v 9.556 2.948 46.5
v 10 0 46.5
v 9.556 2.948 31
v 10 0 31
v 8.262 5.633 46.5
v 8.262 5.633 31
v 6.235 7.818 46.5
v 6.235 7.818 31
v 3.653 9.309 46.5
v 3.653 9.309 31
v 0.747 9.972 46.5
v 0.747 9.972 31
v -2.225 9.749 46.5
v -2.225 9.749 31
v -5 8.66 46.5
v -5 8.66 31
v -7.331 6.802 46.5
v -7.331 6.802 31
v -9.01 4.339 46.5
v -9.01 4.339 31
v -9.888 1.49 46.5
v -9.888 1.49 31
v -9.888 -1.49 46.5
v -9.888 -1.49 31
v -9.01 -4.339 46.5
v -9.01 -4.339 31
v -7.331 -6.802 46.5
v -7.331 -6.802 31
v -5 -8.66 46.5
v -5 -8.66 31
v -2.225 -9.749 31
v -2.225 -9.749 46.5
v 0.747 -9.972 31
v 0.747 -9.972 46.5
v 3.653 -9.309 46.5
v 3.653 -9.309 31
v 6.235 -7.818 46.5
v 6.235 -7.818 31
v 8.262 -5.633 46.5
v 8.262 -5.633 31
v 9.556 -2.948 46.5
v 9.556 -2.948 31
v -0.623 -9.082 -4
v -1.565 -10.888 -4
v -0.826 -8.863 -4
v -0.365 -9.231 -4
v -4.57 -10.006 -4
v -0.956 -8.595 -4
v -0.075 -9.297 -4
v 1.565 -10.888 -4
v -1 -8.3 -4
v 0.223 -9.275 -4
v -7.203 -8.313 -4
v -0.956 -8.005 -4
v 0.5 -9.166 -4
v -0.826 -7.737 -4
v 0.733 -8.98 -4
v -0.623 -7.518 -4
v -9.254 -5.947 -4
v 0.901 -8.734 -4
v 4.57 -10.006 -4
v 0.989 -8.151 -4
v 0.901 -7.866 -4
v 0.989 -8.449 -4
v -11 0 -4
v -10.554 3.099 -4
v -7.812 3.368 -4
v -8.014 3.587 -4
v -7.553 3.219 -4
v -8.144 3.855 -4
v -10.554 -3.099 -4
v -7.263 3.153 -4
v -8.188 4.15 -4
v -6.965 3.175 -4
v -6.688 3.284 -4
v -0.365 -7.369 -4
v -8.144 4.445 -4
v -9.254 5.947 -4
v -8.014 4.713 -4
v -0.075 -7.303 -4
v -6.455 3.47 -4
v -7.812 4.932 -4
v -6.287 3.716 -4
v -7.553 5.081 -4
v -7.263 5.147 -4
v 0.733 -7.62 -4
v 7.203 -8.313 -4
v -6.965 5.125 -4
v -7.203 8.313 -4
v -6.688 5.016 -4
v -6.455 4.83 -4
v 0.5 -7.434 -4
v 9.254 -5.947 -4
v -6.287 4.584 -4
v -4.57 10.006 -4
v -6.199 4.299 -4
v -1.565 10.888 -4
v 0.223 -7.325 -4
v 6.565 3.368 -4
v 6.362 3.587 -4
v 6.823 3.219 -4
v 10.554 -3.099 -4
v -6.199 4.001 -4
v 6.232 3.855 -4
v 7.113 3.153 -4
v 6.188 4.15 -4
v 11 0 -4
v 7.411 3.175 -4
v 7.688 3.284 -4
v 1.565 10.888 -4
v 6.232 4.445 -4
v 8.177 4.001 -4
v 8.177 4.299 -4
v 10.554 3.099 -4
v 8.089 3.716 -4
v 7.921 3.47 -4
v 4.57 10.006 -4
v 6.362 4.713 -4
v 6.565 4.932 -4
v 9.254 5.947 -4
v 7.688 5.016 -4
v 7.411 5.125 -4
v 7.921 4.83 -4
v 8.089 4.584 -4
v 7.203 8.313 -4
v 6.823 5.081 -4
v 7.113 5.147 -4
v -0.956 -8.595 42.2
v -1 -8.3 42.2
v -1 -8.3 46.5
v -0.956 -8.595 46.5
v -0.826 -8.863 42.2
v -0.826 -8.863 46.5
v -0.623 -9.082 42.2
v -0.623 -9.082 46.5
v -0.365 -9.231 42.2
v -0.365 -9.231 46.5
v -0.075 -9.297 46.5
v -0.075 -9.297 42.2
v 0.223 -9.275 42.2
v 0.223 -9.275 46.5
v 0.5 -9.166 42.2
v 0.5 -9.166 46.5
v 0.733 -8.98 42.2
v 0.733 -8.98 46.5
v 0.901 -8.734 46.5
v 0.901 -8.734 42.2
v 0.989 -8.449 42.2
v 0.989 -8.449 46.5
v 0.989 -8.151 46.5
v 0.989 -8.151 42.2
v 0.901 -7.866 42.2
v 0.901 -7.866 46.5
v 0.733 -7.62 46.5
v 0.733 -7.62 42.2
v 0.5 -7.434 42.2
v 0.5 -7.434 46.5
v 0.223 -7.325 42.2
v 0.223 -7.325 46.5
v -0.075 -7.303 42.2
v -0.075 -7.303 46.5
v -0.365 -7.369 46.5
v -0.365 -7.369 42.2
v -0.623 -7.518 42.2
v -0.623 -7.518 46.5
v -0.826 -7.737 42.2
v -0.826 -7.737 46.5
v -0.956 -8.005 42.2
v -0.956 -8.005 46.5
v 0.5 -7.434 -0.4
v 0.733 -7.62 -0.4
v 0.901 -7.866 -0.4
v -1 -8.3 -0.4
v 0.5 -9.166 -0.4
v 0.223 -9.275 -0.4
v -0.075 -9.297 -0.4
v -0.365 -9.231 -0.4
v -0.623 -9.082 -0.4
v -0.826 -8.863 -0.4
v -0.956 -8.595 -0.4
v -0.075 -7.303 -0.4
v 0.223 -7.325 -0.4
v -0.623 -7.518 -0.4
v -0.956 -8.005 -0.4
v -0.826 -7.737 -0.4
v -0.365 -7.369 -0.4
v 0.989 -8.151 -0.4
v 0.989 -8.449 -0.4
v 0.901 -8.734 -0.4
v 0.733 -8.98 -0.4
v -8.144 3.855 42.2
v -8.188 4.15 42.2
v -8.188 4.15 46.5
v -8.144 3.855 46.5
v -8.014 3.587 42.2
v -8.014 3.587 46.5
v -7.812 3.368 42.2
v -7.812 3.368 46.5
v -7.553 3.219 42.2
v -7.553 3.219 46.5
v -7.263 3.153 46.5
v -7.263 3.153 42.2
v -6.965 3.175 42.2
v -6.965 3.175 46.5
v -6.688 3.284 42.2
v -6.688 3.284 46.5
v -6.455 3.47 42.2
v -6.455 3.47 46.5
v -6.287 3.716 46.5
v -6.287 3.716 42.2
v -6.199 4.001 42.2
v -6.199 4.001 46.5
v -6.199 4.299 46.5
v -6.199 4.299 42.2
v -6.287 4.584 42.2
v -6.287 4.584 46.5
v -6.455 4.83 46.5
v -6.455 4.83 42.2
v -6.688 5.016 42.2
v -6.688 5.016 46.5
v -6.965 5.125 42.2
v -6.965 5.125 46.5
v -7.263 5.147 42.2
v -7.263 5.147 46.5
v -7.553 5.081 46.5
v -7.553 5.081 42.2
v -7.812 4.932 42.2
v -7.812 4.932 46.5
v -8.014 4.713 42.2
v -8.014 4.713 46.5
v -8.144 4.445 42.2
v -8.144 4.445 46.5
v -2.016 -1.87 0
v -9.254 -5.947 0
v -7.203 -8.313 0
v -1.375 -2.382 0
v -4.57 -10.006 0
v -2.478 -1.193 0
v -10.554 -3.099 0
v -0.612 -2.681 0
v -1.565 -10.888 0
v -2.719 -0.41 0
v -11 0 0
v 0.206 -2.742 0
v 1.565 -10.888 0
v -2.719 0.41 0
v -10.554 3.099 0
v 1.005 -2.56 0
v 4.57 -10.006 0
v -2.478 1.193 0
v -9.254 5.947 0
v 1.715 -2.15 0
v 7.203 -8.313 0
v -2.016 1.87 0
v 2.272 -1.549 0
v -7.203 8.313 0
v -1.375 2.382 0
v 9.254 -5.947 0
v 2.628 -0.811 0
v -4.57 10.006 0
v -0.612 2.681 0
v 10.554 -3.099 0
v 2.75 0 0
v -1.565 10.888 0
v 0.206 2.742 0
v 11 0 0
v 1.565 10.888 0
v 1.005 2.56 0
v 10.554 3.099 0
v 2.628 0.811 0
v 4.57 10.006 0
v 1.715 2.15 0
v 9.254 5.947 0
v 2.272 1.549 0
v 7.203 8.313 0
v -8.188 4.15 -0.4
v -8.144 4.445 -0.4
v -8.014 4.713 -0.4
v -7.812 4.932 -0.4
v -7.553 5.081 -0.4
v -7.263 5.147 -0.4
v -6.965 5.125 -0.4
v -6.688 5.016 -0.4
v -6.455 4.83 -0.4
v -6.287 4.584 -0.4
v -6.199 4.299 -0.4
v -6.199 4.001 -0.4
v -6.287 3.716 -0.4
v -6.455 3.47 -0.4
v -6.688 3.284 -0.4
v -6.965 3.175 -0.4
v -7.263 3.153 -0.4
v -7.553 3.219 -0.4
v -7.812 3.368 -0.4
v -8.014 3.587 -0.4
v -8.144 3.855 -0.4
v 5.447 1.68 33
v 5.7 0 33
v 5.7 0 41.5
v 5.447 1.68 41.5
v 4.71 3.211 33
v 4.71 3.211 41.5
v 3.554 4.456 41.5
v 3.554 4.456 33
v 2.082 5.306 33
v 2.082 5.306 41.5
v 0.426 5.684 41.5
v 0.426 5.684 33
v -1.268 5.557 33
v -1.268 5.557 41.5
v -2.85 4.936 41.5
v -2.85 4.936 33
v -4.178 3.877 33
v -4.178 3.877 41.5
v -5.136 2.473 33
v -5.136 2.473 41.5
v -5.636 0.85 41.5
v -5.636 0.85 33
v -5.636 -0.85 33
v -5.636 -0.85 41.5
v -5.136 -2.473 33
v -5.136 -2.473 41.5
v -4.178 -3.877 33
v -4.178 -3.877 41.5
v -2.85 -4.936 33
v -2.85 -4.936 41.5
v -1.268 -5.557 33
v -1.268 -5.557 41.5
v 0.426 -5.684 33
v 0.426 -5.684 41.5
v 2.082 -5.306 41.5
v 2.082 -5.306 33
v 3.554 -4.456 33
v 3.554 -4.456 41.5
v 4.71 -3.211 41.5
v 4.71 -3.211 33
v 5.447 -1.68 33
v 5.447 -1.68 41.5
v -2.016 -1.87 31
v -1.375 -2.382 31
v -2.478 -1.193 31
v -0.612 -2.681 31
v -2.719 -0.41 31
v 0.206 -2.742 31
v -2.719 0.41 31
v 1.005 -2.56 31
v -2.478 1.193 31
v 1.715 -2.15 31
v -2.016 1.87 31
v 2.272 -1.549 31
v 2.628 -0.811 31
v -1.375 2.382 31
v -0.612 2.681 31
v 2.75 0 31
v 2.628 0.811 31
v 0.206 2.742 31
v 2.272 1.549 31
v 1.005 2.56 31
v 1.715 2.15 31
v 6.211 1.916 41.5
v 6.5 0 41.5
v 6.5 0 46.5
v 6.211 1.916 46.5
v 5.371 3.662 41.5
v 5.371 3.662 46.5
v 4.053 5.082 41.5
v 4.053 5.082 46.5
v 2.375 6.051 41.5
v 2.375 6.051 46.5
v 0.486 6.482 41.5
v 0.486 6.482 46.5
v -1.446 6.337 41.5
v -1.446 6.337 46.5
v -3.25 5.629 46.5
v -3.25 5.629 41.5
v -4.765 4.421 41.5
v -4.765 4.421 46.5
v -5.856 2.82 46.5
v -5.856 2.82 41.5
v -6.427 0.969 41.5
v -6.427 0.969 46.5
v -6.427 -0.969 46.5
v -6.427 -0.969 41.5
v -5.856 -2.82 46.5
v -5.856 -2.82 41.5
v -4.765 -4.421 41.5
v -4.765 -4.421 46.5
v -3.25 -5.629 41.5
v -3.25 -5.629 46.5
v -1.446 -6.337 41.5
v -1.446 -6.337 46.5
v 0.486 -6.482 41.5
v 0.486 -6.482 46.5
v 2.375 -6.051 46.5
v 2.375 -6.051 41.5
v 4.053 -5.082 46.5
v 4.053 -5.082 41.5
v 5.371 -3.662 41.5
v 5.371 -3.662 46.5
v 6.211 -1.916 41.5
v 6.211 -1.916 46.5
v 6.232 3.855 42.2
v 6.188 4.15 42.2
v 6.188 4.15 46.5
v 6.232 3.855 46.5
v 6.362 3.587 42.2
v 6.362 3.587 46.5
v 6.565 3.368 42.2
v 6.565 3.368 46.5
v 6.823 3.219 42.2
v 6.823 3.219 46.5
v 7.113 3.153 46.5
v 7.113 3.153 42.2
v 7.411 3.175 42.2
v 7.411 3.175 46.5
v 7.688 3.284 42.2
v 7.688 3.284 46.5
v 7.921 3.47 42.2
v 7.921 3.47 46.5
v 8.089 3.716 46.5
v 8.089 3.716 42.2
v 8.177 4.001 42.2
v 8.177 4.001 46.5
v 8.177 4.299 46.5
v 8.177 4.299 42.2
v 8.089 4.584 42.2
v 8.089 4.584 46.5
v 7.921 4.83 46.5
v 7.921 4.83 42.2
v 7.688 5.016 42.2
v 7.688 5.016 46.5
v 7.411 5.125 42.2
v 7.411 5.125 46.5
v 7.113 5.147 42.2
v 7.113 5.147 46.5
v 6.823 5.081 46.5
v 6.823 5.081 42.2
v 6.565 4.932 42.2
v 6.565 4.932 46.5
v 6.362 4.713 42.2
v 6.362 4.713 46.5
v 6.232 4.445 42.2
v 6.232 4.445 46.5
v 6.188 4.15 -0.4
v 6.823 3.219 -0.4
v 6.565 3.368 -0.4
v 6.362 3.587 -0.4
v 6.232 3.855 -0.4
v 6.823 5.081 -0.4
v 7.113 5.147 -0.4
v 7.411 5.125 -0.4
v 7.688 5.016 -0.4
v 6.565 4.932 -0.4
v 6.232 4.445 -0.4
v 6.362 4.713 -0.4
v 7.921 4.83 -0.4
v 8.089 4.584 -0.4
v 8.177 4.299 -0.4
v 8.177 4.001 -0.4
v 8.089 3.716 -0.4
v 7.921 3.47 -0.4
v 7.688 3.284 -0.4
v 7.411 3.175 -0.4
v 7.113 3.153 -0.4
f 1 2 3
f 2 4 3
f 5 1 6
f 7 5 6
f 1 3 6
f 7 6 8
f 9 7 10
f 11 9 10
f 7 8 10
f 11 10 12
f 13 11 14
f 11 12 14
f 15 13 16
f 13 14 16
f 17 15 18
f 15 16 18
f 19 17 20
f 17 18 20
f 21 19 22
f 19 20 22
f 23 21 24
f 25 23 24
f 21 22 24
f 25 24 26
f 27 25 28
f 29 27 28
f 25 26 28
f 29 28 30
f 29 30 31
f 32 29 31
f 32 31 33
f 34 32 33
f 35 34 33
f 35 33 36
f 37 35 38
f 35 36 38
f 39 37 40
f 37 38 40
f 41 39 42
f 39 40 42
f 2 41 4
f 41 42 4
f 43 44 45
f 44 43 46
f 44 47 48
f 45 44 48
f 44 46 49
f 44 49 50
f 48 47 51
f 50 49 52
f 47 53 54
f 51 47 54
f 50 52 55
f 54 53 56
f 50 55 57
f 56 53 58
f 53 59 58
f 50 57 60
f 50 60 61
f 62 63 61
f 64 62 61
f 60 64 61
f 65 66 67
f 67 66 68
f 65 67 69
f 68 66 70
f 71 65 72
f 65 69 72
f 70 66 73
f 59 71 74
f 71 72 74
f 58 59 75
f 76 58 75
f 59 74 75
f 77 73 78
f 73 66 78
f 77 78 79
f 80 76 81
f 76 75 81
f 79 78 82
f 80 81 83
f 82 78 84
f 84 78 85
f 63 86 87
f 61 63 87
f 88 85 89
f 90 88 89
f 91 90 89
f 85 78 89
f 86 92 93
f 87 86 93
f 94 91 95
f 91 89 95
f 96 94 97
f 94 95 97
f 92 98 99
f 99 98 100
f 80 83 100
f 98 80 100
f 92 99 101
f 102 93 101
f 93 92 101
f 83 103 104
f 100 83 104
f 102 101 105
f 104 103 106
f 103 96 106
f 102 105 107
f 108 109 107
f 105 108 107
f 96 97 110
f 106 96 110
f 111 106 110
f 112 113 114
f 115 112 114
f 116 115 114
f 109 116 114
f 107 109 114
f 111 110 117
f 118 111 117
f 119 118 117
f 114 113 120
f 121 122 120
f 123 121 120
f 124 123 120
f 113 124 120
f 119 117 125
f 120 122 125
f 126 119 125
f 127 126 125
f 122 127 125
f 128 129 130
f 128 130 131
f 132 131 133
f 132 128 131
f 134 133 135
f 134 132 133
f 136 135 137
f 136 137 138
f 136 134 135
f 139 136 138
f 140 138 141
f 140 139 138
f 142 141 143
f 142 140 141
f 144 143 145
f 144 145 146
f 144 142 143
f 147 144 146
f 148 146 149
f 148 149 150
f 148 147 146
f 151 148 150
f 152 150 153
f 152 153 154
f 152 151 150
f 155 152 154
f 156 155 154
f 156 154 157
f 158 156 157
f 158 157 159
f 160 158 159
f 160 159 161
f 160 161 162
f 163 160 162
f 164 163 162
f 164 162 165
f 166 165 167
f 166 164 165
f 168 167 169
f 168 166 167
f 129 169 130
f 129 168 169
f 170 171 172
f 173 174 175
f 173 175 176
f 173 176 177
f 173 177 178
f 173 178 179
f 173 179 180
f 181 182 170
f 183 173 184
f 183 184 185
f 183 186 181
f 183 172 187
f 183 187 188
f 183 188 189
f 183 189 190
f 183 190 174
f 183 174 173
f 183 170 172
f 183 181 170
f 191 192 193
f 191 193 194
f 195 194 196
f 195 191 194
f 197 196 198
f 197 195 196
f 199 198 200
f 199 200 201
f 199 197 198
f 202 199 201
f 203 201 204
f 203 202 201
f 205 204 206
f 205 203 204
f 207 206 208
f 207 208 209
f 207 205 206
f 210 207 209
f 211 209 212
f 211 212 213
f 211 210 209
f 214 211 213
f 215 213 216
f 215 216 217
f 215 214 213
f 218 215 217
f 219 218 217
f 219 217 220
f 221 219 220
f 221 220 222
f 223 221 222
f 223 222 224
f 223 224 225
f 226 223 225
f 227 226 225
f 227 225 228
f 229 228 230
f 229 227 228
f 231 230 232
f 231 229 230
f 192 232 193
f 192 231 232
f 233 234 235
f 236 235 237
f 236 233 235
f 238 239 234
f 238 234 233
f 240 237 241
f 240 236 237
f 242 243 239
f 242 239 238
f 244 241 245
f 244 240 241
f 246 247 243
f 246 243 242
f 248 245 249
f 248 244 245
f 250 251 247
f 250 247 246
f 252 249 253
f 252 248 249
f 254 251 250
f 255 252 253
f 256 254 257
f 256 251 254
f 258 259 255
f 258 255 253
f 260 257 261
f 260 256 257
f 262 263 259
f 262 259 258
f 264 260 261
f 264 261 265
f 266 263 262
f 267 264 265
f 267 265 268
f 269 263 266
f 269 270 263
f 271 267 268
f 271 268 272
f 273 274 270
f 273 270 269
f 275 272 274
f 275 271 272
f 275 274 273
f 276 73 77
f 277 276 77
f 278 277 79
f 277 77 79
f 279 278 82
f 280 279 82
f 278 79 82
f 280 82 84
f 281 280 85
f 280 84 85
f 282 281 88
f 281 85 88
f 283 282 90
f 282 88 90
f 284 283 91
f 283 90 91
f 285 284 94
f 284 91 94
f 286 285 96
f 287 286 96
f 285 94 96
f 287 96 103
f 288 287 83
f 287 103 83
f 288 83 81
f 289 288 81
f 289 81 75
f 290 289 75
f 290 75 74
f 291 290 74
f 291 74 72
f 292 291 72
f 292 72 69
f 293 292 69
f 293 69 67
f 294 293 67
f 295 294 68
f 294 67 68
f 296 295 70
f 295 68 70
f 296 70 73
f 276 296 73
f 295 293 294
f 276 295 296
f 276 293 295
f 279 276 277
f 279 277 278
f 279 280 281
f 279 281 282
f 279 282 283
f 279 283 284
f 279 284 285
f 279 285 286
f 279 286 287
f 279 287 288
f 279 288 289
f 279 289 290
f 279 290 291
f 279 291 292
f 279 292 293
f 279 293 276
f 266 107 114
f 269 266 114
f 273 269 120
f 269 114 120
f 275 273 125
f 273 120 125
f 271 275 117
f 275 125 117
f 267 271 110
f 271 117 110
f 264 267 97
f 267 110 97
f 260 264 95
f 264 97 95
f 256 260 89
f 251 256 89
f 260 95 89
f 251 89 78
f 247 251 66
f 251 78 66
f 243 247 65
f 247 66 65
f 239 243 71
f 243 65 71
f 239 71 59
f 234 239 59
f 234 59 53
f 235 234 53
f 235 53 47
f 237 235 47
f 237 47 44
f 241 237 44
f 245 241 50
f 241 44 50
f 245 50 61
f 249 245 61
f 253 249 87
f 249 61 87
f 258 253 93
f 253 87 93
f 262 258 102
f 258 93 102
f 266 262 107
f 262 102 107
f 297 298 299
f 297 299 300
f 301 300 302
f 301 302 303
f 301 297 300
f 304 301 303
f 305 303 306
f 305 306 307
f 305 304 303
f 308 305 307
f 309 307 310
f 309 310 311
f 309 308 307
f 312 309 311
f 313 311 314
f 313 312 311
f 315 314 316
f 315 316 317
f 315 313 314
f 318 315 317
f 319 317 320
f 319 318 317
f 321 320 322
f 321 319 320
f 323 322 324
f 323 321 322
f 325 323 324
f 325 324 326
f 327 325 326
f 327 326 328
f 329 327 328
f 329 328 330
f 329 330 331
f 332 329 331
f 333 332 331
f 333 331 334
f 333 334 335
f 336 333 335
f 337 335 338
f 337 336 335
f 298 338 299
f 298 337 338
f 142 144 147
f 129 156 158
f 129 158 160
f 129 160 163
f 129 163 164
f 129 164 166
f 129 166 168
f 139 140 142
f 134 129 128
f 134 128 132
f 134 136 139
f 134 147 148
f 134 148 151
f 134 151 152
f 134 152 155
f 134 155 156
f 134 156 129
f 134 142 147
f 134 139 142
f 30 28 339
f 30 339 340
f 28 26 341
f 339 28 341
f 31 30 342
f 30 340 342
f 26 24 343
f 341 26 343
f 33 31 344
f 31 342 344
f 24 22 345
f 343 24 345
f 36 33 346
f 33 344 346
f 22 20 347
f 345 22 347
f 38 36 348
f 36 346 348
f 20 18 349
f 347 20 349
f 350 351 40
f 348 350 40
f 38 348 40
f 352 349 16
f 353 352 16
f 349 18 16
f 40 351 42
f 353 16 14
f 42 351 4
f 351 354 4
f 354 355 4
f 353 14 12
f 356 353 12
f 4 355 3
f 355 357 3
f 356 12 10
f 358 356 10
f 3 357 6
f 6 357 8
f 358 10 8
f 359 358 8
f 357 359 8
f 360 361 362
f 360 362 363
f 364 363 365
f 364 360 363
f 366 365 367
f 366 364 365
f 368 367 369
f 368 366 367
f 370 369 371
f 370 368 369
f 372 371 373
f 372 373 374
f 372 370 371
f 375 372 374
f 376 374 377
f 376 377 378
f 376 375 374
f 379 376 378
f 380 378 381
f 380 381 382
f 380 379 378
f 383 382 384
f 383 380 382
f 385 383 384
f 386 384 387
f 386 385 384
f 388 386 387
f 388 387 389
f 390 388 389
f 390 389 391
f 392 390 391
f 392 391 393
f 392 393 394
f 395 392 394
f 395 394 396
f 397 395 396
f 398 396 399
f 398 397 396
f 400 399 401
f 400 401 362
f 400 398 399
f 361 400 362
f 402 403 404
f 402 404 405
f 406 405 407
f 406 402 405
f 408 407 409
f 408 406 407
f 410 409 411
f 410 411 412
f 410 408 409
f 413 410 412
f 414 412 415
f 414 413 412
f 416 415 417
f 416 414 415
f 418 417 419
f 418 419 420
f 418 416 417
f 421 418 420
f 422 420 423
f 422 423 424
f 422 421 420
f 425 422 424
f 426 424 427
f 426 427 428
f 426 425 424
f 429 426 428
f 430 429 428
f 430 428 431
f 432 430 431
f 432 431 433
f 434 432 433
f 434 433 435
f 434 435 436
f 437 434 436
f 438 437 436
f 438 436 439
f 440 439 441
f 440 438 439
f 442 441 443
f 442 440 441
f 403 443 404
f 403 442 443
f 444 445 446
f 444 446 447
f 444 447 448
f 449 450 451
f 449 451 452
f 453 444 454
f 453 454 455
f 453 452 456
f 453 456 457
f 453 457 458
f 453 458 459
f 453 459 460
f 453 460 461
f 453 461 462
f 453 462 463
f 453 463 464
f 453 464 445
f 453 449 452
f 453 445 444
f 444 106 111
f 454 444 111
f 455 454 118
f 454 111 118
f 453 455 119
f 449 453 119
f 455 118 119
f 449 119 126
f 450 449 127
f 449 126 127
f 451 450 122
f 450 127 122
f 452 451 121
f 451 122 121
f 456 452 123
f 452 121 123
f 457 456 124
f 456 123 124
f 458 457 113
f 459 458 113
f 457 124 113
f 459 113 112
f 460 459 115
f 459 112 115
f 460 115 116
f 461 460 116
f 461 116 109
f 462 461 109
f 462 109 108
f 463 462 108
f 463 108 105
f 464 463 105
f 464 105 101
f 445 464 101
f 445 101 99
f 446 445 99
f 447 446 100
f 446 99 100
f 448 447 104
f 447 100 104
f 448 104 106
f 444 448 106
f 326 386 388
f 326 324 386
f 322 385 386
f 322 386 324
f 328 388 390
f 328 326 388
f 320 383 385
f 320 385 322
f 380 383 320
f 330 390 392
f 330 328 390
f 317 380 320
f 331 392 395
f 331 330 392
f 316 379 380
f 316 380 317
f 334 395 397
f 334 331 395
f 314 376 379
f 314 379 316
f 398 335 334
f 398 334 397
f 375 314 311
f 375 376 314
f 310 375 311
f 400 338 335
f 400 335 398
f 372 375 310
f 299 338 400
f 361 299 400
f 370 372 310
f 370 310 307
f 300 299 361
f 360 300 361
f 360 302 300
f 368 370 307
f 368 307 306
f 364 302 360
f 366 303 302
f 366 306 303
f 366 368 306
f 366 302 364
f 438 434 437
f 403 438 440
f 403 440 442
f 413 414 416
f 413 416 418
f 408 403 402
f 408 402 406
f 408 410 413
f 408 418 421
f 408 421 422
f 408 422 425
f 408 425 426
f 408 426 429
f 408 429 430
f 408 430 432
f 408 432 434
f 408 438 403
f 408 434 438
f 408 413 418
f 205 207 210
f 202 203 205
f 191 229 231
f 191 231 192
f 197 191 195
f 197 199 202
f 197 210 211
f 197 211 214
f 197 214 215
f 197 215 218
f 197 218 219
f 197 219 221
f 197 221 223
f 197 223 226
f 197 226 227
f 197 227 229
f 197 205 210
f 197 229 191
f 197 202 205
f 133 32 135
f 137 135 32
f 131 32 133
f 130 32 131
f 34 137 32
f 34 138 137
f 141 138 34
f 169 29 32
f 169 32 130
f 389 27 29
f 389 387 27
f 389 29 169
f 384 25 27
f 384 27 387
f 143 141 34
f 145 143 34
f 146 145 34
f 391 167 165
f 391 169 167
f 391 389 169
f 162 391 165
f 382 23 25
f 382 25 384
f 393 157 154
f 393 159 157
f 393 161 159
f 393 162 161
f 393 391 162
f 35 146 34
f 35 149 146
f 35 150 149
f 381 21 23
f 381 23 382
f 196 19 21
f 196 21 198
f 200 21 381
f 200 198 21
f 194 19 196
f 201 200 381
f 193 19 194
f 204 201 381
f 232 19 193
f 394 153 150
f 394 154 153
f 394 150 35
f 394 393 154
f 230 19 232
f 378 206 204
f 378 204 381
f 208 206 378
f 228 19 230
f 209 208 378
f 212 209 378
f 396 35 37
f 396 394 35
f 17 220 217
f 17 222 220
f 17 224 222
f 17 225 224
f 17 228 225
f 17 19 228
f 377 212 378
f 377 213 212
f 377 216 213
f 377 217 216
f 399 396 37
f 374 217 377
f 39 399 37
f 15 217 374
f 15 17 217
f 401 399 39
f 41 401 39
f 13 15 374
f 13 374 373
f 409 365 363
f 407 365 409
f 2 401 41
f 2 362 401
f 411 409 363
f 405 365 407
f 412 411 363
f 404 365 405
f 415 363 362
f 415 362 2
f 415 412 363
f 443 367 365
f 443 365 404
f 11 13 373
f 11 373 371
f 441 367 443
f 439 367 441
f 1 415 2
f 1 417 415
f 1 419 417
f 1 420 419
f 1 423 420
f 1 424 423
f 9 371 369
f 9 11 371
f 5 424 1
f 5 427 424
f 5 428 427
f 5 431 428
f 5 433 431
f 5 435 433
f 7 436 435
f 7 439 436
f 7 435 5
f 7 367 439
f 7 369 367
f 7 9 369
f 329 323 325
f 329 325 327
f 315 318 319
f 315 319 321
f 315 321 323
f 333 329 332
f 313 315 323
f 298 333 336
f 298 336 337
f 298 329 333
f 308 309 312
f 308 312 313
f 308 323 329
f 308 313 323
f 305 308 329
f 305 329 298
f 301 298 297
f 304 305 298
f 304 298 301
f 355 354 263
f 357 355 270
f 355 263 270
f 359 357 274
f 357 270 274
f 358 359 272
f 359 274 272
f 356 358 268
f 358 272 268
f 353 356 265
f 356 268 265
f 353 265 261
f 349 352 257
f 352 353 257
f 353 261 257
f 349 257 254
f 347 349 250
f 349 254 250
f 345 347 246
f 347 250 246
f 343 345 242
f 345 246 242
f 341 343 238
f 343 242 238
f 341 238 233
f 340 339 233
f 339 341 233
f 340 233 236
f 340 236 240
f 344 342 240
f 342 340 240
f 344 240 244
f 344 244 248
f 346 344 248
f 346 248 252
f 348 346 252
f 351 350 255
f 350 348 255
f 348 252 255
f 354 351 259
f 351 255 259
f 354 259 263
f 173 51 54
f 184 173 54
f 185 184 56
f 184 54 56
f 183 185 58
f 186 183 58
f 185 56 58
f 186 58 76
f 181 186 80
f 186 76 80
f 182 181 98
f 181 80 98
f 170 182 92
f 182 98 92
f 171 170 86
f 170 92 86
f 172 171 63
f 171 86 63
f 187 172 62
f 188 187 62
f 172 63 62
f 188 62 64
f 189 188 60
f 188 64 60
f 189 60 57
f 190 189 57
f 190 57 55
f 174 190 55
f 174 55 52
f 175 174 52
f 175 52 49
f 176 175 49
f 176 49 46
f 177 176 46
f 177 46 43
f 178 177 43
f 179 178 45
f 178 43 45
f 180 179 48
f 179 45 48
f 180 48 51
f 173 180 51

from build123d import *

# Parameters (mm, degrees)
MOUNTING_FLANGE_START                          = -4
SKETCH1_R                                      = 11
MOUNTING_FLANGE_DEPTH                          = 4
SKETCH2_R                                      = 2.75
D5P5_CENTRAL_POST_DEPTH                        = 31.01
CLOSED_FLOOR_BELOW_SHAFT_NOSE_START            = 31
SKETCH3_R                                      = 10
CLOSED_FLOOR_BELOW_SHAFT_NOSE_DEPTH            = 2
SHAFT_AND_CLIP_CLEARANCE_START                 = 33
SKETCH4_R                                      = 10
SKETCH4_R_2                                    = 5.7
SHAFT_AND_CLIP_CLEARANCE_DEPTH                 = 8.5
LOWER_686ZZ_SEAT_START                         = 41.5
SKETCH5_R                                      = 10
SKETCH5_R_2                                    = 6.5
LOWER_686ZZ_SEAT_DEPTH                         = 5
SKETCH6_R                                      = 1
BASE_THREE_M2_BLIND_THREAD_MAJOR_ENVELOP_DEPTH = 3.6
TOP_CAP_THREE_M2_BLIND_THREAD_MAJOR_ENVE_START = -4.3
SKETCH7_R                                      = 1
TOP_CAP_THREE_M2_BLIND_THREAD_MAJOR_ENVE_DEPTH = 4.3


with BuildPart() as part:
    # Sketch1 → Mounting_Flange (new body)
    with BuildSketch(Plane.XY.offset(MOUNTING_FLANGE_START)):
        Circle(SKETCH1_R)
    extrude(amount=MOUNTING_FLANGE_DEPTH)

    # Sketch2 → D5p5_Central_Post (add)
    with BuildSketch(Plane.XY):
        Circle(SKETCH2_R)
    extrude(amount=D5P5_CENTRAL_POST_DEPTH)

    # Sketch3 → Closed_Floor_Below_Shaft_Nose (add)
    with BuildSketch(Plane.XY.offset(CLOSED_FLOOR_BELOW_SHAFT_NOSE_START)):
        Circle(SKETCH3_R)
    extrude(amount=CLOSED_FLOOR_BELOW_SHAFT_NOSE_DEPTH)

    # Sketch4 → Shaft_And_Clip_Clearance (add)
    with BuildSketch(Plane.XY.offset(SHAFT_AND_CLIP_CLEARANCE_START)):
        Circle(SKETCH4_R)
        Circle(SKETCH4_R_2, mode=Mode.SUBTRACT)
    extrude(amount=SHAFT_AND_CLIP_CLEARANCE_DEPTH)

    # Sketch5 → Lower_686ZZ_Seat (add)
    with BuildSketch(Plane.XY.offset(LOWER_686ZZ_SEAT_START)):
        Circle(SKETCH5_R)
        Circle(SKETCH5_R_2, mode=Mode.SUBTRACT)
    extrude(amount=LOWER_686ZZ_SEAT_DEPTH)

    # Sketch6 → Base_Three_M2_Blind_Thread_Major_Envelopes (cut)
    with BuildSketch(Plane(origin=(0, 0, -4), x_dir=(-1, 0, 0), z_dir=(0, 0, -1))):
        with Locations((-7.188010851, 4.15)):
            Circle(SKETCH6_R)
        with Locations((7.188010851, 4.15)):
            Circle(SKETCH6_R)
        with Locations((0, -8.3)):
            Circle(SKETCH6_R)
    extrude(amount=-BASE_THREE_M2_BLIND_THREAD_MAJOR_ENVELOP_DEPTH, mode=Mode.SUBTRACT)

    # Sketch7 → Top_Cap_Three_M2_Blind_Thread_Major_Envelopes (cut)
    with BuildSketch(Plane.XY.offset(46.5).offset(TOP_CAP_THREE_M2_BLIND_THREAD_MAJOR_ENVE_START)):
        with Locations(Location((7.188010851, 4.15, 0), (0, 0, 180))):
            Circle(SKETCH7_R)
        with Locations(Location((-7.188010851, 4.15, 0), (0, 0, 180))):
            Circle(SKETCH7_R)
        with Locations(Location((0, -8.3, 0), (0, 0, 180))):
            Circle(SKETCH7_R)
    extrude(amount=TOP_CAP_THREE_M2_BLIND_THREAD_MAJOR_ENVE_DEPTH, mode=Mode.SUBTRACT)


solid = part.part
